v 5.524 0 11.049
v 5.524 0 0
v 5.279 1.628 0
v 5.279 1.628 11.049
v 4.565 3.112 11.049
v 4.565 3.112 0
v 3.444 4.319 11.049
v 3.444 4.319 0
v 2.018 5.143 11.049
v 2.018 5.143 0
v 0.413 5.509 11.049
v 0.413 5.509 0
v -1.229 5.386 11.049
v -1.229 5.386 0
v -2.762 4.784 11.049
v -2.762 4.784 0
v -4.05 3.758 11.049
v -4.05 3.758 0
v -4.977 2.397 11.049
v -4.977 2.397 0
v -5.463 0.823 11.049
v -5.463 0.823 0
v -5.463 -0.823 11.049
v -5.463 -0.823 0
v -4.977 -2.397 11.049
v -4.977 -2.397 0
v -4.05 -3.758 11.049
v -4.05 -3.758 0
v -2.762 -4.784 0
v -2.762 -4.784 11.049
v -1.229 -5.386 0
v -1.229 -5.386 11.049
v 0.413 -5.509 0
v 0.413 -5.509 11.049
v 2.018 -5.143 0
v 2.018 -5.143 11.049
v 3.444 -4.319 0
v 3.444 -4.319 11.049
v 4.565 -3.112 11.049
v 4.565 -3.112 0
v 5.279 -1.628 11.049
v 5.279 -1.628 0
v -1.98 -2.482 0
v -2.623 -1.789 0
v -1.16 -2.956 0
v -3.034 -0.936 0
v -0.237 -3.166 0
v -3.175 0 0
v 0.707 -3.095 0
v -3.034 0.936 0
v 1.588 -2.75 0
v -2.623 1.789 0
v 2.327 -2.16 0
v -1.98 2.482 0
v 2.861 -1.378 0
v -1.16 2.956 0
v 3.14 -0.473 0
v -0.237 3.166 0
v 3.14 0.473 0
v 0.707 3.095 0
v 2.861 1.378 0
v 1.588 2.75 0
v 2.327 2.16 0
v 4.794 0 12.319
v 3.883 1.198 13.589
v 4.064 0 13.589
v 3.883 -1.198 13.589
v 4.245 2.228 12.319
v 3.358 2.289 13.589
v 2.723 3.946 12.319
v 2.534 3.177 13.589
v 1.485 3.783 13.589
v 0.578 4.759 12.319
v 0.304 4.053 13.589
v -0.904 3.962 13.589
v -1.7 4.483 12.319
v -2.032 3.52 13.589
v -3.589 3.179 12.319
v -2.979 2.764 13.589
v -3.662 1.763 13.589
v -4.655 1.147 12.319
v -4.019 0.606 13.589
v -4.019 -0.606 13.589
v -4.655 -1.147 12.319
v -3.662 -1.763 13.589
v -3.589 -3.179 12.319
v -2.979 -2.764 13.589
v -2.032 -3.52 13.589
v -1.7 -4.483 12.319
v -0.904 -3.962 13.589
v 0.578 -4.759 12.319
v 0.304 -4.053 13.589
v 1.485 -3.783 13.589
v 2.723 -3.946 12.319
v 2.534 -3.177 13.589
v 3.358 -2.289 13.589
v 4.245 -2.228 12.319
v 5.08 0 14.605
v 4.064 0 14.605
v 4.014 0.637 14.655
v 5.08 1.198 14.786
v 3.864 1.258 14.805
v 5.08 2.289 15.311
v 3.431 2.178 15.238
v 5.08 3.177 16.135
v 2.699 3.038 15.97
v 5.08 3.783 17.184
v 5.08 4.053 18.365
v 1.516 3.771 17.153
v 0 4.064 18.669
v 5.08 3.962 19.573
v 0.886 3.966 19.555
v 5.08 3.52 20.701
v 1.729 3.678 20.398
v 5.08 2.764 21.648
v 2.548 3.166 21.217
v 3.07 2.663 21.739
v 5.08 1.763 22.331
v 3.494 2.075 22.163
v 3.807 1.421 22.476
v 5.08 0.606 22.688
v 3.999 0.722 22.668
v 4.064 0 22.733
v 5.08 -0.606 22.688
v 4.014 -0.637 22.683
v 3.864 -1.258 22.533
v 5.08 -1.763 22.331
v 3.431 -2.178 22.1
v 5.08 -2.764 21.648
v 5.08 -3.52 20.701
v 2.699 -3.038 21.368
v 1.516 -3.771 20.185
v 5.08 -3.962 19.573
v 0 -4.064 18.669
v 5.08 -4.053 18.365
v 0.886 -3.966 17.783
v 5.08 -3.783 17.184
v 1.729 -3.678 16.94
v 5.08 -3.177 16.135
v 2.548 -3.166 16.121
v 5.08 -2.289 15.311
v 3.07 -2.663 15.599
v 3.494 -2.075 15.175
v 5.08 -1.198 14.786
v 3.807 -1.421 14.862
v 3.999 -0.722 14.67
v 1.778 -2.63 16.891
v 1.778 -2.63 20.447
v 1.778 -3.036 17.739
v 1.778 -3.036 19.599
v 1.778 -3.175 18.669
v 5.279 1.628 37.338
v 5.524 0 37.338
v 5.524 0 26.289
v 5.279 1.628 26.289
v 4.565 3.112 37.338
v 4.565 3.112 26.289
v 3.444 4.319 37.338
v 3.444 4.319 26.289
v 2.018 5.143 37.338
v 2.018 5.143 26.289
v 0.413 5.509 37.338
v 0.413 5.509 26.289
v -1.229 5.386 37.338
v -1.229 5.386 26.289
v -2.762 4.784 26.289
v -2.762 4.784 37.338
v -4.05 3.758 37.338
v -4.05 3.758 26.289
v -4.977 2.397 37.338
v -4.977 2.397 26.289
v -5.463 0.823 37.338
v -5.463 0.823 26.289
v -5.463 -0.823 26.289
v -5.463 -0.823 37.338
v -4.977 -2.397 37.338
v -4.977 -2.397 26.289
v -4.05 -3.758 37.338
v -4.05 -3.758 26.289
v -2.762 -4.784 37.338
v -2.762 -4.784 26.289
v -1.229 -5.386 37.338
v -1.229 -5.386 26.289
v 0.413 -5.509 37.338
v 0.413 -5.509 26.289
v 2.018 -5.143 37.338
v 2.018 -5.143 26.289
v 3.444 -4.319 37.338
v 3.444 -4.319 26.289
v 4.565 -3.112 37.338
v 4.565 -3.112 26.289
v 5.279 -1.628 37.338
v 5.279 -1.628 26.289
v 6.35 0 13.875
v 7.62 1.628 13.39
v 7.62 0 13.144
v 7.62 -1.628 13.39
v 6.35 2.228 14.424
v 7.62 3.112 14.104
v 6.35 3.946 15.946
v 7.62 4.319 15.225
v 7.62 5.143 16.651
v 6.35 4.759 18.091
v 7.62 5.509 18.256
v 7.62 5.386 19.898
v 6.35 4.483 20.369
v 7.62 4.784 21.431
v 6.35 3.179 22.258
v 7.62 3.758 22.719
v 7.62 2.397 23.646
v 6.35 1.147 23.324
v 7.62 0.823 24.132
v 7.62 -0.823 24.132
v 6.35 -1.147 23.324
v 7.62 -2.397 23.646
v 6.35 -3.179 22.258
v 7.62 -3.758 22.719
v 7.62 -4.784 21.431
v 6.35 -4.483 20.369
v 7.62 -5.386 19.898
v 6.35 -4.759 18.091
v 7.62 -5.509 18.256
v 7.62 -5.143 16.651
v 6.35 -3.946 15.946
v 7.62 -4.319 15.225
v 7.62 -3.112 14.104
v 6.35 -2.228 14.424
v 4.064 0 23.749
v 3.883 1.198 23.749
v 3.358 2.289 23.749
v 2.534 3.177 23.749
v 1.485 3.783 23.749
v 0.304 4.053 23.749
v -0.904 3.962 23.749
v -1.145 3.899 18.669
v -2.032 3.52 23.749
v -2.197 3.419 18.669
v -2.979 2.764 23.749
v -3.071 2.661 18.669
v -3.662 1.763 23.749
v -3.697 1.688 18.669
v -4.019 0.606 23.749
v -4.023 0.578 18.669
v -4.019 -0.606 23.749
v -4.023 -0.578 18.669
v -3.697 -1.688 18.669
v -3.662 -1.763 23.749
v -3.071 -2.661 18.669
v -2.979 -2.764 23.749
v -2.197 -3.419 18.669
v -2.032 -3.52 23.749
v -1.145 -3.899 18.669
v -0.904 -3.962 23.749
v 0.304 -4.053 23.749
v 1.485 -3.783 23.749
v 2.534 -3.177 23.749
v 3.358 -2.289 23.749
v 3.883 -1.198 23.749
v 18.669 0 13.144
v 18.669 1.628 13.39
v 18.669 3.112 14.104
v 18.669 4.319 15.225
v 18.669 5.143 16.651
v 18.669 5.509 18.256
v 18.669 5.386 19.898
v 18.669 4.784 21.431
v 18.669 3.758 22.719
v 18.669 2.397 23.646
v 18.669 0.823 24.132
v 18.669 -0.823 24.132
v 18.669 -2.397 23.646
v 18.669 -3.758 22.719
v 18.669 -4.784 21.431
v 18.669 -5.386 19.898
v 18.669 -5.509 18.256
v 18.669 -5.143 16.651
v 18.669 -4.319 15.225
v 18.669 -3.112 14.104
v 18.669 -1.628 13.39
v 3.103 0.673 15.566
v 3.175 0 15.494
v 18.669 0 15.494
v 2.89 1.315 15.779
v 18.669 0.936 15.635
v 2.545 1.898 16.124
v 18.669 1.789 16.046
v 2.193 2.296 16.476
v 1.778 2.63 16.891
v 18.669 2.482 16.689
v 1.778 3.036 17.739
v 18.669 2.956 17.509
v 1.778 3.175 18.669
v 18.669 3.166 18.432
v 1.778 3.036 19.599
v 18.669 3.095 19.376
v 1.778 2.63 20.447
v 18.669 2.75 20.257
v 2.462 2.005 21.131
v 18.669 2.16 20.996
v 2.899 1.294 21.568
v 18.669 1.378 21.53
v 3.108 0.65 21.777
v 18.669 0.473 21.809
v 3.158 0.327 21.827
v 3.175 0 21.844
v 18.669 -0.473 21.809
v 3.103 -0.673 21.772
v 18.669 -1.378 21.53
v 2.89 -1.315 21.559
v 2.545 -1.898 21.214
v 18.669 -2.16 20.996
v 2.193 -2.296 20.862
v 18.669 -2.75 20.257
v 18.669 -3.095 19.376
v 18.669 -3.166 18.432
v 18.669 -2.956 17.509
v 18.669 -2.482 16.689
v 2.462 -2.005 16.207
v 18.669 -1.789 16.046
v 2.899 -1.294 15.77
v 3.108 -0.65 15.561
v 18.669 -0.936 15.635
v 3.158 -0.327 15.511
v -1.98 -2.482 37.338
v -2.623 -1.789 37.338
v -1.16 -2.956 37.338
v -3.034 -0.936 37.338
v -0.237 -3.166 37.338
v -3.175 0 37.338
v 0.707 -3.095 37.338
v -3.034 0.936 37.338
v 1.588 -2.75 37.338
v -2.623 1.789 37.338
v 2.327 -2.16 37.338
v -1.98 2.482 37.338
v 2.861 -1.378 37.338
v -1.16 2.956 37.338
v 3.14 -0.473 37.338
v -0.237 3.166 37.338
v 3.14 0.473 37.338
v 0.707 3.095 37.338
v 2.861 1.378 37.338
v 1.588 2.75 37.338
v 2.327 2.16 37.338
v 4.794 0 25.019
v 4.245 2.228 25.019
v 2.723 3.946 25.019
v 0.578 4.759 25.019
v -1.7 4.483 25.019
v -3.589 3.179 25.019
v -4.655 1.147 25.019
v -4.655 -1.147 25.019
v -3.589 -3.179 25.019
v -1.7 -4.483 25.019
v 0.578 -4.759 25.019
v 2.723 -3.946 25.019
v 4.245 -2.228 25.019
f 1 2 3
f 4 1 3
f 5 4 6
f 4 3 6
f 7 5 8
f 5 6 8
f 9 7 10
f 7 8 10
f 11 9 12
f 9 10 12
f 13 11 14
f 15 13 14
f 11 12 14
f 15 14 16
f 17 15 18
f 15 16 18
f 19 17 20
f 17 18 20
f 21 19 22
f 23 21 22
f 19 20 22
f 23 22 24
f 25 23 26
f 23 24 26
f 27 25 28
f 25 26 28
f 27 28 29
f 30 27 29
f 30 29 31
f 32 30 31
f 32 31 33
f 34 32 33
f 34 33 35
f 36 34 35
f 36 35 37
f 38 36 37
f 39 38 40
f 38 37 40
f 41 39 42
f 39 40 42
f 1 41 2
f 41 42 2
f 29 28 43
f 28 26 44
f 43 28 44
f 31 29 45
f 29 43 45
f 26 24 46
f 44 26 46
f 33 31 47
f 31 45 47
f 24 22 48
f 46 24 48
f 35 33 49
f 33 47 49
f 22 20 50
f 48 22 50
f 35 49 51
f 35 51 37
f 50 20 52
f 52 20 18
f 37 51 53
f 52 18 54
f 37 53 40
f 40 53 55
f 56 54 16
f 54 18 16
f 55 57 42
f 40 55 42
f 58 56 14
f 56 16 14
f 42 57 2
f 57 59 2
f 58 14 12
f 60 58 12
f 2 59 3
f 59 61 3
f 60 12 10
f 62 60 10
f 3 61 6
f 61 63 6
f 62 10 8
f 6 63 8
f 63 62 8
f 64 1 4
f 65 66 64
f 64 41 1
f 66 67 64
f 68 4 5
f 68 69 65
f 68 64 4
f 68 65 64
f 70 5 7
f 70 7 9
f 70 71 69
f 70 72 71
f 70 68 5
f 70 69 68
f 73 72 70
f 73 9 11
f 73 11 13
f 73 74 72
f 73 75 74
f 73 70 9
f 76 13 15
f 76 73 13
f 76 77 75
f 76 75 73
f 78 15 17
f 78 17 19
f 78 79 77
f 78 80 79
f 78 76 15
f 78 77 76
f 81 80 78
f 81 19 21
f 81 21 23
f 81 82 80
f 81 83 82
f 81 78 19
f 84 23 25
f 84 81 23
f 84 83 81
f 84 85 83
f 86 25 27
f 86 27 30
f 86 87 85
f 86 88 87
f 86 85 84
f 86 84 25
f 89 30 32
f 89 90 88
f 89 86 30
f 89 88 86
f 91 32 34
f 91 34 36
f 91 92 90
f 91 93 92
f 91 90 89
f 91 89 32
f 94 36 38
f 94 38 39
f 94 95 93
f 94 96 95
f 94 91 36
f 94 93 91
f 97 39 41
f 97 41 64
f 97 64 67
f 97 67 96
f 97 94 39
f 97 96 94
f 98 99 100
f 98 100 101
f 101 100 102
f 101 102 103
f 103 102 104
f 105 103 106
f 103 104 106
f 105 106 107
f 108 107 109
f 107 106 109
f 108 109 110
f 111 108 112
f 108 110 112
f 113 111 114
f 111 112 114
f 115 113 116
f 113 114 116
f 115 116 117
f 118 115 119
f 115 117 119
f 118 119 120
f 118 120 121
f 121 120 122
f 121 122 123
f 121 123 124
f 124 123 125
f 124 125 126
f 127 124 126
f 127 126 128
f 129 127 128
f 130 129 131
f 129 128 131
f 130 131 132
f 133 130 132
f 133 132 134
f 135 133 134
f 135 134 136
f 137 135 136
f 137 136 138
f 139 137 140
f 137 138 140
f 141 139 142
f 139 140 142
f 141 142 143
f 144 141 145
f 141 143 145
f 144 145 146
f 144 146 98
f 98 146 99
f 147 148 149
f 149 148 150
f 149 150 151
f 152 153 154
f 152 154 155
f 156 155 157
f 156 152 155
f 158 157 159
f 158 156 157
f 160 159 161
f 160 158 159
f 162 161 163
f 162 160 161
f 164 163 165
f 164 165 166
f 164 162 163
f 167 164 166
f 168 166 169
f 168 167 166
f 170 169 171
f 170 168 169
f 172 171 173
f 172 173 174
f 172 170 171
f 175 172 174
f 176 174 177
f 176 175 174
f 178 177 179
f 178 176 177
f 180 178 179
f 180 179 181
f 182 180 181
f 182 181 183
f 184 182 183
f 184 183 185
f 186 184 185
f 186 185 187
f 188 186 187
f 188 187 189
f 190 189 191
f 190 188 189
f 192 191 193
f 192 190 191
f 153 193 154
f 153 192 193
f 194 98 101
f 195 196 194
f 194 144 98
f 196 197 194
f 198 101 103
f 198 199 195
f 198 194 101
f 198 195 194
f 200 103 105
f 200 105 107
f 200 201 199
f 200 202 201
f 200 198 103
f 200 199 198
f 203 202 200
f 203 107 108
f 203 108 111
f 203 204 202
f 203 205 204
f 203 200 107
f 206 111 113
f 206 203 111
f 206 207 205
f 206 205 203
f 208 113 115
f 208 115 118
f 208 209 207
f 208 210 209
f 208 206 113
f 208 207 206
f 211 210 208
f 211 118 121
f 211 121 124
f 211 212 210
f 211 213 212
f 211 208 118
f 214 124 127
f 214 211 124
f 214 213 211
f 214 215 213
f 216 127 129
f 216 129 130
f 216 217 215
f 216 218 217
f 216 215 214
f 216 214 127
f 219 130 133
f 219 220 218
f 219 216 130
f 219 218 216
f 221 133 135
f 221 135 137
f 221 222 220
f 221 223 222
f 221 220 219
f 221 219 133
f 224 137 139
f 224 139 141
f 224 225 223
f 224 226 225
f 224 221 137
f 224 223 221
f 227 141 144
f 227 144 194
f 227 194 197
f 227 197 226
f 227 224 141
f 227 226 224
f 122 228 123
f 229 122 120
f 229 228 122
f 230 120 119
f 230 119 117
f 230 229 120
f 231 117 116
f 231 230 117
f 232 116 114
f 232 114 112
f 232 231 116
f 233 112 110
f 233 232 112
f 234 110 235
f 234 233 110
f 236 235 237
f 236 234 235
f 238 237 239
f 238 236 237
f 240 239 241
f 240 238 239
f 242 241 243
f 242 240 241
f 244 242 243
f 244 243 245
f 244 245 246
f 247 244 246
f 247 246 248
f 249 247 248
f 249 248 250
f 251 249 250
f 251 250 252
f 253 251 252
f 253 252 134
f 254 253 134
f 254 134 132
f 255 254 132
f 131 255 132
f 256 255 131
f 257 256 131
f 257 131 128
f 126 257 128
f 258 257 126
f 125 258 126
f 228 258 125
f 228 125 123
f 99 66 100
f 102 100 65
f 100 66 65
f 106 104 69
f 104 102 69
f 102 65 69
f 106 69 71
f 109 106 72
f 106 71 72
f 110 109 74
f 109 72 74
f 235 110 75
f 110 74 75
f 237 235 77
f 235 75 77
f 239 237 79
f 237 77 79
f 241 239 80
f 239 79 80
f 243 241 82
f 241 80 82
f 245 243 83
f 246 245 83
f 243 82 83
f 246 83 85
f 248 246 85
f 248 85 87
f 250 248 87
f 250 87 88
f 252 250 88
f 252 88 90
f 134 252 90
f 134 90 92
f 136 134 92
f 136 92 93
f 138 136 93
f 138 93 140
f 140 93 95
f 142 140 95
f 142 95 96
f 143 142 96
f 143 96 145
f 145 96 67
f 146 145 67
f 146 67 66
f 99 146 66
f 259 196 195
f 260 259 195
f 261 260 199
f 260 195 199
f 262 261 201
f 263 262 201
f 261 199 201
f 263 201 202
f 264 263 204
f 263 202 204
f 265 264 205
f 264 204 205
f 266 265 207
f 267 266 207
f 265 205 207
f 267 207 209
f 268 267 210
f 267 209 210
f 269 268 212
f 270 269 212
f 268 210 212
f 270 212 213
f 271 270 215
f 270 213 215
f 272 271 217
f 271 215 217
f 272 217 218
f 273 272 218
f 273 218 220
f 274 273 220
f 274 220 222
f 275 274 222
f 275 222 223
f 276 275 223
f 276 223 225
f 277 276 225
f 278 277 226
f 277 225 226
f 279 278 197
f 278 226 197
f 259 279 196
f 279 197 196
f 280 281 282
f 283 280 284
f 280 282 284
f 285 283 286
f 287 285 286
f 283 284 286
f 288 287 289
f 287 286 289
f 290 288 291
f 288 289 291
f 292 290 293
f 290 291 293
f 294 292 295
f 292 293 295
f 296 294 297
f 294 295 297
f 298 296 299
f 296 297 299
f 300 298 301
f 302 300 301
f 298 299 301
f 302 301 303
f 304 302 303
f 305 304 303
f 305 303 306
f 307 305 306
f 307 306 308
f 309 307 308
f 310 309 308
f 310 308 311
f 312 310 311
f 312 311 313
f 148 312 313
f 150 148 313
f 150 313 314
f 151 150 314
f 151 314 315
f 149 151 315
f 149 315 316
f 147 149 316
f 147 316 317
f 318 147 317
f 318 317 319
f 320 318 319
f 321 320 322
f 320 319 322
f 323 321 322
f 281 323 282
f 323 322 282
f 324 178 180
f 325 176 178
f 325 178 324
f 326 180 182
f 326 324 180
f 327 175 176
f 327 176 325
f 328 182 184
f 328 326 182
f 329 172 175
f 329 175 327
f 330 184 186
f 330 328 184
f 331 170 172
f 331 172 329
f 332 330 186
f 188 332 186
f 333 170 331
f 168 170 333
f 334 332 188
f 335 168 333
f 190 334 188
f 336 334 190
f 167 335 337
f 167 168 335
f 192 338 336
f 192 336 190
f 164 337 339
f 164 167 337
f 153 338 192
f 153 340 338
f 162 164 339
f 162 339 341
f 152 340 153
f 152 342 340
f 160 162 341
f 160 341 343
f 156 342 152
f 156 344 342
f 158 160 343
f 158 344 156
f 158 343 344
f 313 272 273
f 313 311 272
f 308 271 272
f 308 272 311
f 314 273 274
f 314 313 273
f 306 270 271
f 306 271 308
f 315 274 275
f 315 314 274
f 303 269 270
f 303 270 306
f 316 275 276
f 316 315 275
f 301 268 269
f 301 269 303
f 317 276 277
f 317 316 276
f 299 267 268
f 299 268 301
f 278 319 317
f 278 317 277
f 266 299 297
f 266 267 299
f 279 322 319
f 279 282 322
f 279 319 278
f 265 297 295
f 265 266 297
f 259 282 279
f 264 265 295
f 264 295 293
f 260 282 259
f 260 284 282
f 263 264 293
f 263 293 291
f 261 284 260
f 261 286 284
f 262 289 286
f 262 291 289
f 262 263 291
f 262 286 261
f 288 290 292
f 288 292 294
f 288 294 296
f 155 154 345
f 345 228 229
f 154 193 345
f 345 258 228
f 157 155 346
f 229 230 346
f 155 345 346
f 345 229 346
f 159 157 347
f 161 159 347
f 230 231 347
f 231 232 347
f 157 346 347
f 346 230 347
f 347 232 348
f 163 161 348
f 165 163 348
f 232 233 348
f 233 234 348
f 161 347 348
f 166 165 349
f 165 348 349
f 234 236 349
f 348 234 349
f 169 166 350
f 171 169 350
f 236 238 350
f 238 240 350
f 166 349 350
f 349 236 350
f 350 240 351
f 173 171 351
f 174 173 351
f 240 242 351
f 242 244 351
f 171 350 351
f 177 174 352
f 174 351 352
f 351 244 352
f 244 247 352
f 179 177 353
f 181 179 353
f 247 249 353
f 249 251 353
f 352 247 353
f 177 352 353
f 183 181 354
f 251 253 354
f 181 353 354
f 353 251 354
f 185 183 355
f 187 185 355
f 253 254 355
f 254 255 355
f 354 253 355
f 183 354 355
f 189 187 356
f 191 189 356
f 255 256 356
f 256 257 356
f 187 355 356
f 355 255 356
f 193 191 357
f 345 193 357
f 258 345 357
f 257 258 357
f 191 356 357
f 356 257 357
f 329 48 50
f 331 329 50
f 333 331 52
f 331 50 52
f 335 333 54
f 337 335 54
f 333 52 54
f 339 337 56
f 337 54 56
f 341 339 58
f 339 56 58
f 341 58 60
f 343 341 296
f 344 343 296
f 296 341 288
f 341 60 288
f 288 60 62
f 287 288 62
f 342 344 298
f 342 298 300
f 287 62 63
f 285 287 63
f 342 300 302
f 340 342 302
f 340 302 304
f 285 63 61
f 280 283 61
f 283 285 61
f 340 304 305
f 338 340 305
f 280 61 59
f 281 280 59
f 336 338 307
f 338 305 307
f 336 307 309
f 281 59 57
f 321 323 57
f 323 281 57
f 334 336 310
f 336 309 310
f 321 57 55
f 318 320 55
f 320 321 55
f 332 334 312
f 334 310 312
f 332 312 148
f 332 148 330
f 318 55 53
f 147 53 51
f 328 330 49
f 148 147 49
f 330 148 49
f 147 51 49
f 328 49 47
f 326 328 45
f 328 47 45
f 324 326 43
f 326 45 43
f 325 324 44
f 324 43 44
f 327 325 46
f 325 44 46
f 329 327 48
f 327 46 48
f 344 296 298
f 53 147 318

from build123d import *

# Parameters (mm, degrees)
SKETCH1_R           = 5.5245
BOSS_EXTRUDE1_DEPTH = 11.049
SKETCH2_R           = 4.064
BOSS_EXTRUDE2_DEPTH = 5.08
SKETCH3_R           = 5.5245
SKETCH4_R           = 4.064
SKETCH5_R           = 4.064
BOSS_EXTRUDE3_DEPTH = 5.08
SKETCH6_R           = 5.5245
BOSS_EXTRUDE4_DEPTH = 11.049
SKETCH7_R           = 3.175
CUT_EXTRUDE1_DEPTH  = 16.891
SKETCH9_R           = 3.175
CUT_EXTRUDE2_DEPTH  = 49.403


with BuildPart() as part:
    # Sketch1 → Boss-Extrude1 (new body)
    with BuildSketch(Plane.XY):
        Circle(SKETCH1_R)
    boss_extrude1 = extrude(amount=BOSS_EXTRUDE1_DEPTH)



with BuildPart() as body_2:
    # Sketch2 → Boss-Extrude2 (new body)
    with BuildSketch(Plane.XY.offset(13.589)):
        Circle(SKETCH2_R)
    boss_extrude2 = extrude(amount=BOSS_EXTRUDE2_DEPTH)


with BuildPart() as part_1:
    add(part.part)

    add(body_2.part)  # Loft2 merges body 2
    # Sketch3 → Loft2 section 0
    with BuildSketch(Plane.XY.offset(11.049)):
        Circle(SKETCH3_R)
    # Sketch4 → Loft2 section 1
    with BuildSketch(Plane.XY.offset(13.589)):
        Circle(SKETCH4_R)
    loft2 = loft()

    # Mirror5: Boss-Extrude1, Boss-Extrude2, Loft2 across plane
    add(boss_extrude1.mirror(Plane.XY.offset(18.669)))
    add(boss_extrude2.mirror(Plane.XY.offset(18.669)))
    add(loft2.mirror(Plane.XY.offset(18.669)))

    # Sketch5 → Boss-Extrude3 (add)
    with BuildSketch(Plane(origin=(0, 0, 0), x_dir=(0, 0, -1), z_dir=(1, 0, 0))):
        with Locations((-18.669, 0)):
            Circle(SKETCH5_R)
    extrude(amount=BOSS_EXTRUDE3_DEPTH)



with BuildPart() as body_2_2:
    # Sketch6 → Boss-Extrude4 (new body)
    with BuildSketch(Plane(origin=(7.62, 0, 0), x_dir=(0, 0, -1), z_dir=(1, 0, 0))):
        with Locations((-18.669, 0)):
            Circle(SKETCH6_R)
    extrude(amount=BOSS_EXTRUDE4_DEPTH)


with BuildPart() as part_2:
    add(part_1.part)

    add(body_2_2.part)  # loft3 joins it to this body
    # loft up to a face of the part (loft3)
    loft([Face(Wire([part_2.edges().sort_by_distance((5.08, 2.962528502, 21.450999438))[0]])), Face(Wire([part_2.edges().sort_by_distance((7.62, -4.027187182, 22.450780487))[0]]))])

    # Sketch7 → Cut-Extrude1 (cut)
    with BuildSketch(Plane(origin=(18.669, 0, 0), x_dir=(0, 0, -1), z_dir=(1, 0, 0))):
        with Locations((-18.669, 0)):
            Circle(SKETCH7_R)
    extrude(amount=-CUT_EXTRUDE1_DEPTH, mode=Mode.SUBTRACT)

    # Sketch9 → Cut-Extrude2 (cut)
    with BuildSketch(Plane(origin=(0, 0, 0), x_dir=(-1, 0, 0), z_dir=(0, 0, -1))):
        Circle(SKETCH9_R)
    extrude(amount=-CUT_EXTRUDE2_DEPTH, mode=Mode.SUBTRACT)


solid = part_2.part
